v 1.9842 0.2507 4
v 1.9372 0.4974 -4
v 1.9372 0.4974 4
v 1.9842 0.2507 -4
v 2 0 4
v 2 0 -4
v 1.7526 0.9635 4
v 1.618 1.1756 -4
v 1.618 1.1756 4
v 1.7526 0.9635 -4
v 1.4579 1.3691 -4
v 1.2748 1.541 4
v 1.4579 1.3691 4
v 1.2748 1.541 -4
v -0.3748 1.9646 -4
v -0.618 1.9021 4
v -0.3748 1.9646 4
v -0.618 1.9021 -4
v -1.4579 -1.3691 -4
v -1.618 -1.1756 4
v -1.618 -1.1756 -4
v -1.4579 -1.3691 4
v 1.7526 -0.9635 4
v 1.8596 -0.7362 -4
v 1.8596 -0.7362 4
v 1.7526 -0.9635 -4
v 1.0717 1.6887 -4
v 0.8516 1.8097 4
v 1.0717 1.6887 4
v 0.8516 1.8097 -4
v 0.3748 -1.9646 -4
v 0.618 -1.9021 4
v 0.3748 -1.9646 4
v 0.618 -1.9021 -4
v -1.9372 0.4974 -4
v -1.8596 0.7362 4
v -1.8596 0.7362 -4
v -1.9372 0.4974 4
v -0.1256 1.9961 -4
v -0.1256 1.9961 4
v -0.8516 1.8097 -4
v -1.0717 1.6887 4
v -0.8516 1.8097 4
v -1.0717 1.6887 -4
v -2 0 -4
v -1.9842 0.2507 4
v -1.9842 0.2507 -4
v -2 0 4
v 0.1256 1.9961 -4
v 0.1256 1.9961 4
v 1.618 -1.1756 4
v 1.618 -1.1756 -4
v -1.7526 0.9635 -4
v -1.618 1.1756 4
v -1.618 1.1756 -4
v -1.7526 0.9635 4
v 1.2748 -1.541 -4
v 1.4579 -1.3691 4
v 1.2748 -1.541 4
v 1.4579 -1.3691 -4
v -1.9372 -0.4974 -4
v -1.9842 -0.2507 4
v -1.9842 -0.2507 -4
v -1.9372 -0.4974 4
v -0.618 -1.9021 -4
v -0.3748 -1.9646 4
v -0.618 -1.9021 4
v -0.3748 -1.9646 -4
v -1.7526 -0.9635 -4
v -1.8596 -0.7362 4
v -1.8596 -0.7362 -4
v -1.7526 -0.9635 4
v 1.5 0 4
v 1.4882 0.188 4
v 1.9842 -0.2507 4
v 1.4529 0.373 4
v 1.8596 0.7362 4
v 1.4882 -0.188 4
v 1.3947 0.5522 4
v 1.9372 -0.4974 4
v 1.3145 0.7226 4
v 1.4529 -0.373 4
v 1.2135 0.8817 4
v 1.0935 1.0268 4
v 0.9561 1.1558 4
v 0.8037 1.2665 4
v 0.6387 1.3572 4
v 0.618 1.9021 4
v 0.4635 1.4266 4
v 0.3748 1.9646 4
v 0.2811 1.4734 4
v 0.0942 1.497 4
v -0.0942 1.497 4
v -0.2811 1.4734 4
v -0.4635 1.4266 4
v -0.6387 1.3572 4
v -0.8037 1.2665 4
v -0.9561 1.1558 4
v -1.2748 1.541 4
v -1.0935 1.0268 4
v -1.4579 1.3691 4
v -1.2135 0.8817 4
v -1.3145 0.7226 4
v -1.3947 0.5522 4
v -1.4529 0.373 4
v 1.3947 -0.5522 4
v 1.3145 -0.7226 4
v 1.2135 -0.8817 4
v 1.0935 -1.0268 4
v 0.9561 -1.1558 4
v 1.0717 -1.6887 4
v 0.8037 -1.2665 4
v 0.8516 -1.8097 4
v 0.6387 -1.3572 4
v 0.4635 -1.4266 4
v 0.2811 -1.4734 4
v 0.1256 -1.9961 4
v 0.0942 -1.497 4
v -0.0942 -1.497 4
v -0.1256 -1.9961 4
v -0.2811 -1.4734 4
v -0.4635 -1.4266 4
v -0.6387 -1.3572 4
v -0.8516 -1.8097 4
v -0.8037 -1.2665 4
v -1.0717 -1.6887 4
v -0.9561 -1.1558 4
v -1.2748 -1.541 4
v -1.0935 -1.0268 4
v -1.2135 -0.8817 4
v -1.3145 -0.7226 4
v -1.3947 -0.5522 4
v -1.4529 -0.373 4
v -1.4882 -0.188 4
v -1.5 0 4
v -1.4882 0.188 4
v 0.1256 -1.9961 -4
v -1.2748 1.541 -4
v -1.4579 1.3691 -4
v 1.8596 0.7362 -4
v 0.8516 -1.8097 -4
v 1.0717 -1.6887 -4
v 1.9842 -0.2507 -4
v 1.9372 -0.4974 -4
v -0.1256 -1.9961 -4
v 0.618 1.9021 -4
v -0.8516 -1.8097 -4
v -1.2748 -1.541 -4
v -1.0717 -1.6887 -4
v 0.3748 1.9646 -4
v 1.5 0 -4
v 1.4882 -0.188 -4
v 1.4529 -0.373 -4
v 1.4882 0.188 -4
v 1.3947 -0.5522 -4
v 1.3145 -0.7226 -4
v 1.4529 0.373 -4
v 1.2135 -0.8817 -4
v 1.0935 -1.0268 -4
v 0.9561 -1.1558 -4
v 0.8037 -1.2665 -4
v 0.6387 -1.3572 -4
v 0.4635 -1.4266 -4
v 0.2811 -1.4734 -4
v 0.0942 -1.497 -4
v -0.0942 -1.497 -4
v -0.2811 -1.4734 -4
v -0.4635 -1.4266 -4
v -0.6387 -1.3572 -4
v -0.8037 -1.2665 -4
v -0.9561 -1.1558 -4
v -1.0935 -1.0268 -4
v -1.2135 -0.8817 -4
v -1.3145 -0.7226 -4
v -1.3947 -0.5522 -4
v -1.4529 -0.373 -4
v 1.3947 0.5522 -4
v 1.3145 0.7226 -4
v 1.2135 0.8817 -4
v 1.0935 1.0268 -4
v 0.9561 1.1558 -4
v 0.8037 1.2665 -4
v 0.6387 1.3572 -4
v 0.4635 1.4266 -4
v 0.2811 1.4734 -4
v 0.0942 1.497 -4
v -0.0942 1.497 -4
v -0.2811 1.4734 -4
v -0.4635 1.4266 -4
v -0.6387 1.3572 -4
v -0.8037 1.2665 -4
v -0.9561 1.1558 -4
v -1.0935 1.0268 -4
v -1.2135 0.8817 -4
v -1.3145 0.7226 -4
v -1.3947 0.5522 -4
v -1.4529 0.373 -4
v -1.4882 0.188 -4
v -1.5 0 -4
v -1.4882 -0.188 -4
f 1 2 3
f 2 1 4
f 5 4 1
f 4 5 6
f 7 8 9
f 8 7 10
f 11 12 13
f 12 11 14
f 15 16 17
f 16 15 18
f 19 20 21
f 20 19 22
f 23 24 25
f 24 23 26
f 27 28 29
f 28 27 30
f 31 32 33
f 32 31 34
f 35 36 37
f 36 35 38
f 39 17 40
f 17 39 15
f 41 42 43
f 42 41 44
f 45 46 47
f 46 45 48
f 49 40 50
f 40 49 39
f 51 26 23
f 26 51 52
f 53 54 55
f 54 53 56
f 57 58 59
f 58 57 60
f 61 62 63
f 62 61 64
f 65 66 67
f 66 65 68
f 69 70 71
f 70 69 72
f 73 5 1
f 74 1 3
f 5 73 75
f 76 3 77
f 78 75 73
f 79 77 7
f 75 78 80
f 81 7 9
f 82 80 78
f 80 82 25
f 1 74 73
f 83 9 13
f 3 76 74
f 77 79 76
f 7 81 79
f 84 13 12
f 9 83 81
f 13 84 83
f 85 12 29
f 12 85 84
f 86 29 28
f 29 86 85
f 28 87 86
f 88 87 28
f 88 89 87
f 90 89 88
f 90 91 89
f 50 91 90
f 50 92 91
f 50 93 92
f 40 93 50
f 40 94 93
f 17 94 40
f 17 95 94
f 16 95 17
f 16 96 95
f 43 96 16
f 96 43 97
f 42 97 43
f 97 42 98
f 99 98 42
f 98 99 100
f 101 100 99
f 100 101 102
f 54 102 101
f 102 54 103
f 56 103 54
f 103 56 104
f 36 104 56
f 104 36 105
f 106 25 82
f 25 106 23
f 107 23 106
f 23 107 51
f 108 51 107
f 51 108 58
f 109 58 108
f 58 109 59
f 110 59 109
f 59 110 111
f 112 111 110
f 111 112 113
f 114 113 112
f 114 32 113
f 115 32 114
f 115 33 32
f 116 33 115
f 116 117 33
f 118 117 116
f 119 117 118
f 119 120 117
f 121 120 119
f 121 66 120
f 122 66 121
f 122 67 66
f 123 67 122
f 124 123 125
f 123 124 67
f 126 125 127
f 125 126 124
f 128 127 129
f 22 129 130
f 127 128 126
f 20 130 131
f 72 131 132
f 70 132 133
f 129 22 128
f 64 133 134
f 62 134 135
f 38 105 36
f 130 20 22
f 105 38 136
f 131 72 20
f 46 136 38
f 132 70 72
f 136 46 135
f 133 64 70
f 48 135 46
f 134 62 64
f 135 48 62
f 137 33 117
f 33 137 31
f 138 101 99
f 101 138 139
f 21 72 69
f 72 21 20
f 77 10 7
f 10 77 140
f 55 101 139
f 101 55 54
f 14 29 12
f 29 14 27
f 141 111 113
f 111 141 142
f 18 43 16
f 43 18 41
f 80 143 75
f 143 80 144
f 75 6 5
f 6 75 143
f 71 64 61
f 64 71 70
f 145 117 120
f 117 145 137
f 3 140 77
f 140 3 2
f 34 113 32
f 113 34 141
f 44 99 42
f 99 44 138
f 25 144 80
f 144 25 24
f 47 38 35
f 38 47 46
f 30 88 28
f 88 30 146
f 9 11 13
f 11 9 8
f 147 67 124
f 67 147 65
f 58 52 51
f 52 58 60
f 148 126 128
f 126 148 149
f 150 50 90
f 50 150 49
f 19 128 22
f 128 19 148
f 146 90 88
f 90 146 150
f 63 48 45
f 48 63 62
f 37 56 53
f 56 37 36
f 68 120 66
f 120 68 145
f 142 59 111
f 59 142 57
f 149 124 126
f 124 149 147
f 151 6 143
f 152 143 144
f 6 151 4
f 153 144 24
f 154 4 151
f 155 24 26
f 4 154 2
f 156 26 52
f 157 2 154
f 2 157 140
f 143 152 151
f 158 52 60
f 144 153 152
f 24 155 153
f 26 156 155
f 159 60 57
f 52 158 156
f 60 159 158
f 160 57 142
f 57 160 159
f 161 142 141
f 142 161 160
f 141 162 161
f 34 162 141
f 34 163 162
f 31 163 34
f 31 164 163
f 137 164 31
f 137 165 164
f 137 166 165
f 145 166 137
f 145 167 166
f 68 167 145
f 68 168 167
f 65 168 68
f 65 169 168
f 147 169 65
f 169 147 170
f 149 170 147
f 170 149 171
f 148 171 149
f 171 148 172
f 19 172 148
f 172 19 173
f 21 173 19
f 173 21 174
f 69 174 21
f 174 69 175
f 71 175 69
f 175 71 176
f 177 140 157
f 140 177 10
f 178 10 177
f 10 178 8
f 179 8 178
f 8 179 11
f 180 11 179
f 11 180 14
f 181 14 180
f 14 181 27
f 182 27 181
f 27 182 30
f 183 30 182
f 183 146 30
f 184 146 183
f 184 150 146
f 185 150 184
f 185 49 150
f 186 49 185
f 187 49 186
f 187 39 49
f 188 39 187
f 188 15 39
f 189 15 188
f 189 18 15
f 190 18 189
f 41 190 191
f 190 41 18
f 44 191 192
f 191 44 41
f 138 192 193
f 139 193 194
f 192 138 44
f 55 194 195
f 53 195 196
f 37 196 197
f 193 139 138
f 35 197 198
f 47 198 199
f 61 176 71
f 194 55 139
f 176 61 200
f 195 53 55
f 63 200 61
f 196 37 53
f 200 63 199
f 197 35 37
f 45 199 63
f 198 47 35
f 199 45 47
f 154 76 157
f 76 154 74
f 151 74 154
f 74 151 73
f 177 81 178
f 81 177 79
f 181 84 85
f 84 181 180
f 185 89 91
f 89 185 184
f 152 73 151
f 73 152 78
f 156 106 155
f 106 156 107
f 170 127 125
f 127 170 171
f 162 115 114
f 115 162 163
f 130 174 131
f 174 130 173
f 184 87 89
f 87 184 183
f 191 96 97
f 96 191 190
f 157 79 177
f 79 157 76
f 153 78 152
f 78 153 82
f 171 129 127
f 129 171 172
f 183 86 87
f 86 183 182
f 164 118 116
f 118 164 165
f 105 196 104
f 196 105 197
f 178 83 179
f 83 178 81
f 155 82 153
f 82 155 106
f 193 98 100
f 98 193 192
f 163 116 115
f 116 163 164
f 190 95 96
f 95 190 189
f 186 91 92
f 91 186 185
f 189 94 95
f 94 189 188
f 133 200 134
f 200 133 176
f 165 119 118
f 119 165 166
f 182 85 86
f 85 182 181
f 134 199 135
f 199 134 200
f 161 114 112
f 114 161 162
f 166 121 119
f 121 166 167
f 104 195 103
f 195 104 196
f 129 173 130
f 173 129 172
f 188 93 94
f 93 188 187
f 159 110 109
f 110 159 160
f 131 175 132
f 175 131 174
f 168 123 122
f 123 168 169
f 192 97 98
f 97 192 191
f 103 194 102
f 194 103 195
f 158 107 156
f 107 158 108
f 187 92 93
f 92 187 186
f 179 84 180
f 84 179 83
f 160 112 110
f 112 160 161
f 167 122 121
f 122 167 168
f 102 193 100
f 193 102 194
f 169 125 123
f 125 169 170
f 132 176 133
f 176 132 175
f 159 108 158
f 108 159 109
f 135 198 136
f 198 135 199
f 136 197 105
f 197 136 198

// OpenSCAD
$fn = 50;


difference() {
	union() {
		translate(v = [0, 0, -4.0000000000]) {
			cylinder(h = 8, r = 2.0000000000);
		}
	}
	union() {
		translate(v = [0, 0, -100.0000000000]) {
			cylinder(h = 200, r = 1.5000000000);
		}
	}
}
